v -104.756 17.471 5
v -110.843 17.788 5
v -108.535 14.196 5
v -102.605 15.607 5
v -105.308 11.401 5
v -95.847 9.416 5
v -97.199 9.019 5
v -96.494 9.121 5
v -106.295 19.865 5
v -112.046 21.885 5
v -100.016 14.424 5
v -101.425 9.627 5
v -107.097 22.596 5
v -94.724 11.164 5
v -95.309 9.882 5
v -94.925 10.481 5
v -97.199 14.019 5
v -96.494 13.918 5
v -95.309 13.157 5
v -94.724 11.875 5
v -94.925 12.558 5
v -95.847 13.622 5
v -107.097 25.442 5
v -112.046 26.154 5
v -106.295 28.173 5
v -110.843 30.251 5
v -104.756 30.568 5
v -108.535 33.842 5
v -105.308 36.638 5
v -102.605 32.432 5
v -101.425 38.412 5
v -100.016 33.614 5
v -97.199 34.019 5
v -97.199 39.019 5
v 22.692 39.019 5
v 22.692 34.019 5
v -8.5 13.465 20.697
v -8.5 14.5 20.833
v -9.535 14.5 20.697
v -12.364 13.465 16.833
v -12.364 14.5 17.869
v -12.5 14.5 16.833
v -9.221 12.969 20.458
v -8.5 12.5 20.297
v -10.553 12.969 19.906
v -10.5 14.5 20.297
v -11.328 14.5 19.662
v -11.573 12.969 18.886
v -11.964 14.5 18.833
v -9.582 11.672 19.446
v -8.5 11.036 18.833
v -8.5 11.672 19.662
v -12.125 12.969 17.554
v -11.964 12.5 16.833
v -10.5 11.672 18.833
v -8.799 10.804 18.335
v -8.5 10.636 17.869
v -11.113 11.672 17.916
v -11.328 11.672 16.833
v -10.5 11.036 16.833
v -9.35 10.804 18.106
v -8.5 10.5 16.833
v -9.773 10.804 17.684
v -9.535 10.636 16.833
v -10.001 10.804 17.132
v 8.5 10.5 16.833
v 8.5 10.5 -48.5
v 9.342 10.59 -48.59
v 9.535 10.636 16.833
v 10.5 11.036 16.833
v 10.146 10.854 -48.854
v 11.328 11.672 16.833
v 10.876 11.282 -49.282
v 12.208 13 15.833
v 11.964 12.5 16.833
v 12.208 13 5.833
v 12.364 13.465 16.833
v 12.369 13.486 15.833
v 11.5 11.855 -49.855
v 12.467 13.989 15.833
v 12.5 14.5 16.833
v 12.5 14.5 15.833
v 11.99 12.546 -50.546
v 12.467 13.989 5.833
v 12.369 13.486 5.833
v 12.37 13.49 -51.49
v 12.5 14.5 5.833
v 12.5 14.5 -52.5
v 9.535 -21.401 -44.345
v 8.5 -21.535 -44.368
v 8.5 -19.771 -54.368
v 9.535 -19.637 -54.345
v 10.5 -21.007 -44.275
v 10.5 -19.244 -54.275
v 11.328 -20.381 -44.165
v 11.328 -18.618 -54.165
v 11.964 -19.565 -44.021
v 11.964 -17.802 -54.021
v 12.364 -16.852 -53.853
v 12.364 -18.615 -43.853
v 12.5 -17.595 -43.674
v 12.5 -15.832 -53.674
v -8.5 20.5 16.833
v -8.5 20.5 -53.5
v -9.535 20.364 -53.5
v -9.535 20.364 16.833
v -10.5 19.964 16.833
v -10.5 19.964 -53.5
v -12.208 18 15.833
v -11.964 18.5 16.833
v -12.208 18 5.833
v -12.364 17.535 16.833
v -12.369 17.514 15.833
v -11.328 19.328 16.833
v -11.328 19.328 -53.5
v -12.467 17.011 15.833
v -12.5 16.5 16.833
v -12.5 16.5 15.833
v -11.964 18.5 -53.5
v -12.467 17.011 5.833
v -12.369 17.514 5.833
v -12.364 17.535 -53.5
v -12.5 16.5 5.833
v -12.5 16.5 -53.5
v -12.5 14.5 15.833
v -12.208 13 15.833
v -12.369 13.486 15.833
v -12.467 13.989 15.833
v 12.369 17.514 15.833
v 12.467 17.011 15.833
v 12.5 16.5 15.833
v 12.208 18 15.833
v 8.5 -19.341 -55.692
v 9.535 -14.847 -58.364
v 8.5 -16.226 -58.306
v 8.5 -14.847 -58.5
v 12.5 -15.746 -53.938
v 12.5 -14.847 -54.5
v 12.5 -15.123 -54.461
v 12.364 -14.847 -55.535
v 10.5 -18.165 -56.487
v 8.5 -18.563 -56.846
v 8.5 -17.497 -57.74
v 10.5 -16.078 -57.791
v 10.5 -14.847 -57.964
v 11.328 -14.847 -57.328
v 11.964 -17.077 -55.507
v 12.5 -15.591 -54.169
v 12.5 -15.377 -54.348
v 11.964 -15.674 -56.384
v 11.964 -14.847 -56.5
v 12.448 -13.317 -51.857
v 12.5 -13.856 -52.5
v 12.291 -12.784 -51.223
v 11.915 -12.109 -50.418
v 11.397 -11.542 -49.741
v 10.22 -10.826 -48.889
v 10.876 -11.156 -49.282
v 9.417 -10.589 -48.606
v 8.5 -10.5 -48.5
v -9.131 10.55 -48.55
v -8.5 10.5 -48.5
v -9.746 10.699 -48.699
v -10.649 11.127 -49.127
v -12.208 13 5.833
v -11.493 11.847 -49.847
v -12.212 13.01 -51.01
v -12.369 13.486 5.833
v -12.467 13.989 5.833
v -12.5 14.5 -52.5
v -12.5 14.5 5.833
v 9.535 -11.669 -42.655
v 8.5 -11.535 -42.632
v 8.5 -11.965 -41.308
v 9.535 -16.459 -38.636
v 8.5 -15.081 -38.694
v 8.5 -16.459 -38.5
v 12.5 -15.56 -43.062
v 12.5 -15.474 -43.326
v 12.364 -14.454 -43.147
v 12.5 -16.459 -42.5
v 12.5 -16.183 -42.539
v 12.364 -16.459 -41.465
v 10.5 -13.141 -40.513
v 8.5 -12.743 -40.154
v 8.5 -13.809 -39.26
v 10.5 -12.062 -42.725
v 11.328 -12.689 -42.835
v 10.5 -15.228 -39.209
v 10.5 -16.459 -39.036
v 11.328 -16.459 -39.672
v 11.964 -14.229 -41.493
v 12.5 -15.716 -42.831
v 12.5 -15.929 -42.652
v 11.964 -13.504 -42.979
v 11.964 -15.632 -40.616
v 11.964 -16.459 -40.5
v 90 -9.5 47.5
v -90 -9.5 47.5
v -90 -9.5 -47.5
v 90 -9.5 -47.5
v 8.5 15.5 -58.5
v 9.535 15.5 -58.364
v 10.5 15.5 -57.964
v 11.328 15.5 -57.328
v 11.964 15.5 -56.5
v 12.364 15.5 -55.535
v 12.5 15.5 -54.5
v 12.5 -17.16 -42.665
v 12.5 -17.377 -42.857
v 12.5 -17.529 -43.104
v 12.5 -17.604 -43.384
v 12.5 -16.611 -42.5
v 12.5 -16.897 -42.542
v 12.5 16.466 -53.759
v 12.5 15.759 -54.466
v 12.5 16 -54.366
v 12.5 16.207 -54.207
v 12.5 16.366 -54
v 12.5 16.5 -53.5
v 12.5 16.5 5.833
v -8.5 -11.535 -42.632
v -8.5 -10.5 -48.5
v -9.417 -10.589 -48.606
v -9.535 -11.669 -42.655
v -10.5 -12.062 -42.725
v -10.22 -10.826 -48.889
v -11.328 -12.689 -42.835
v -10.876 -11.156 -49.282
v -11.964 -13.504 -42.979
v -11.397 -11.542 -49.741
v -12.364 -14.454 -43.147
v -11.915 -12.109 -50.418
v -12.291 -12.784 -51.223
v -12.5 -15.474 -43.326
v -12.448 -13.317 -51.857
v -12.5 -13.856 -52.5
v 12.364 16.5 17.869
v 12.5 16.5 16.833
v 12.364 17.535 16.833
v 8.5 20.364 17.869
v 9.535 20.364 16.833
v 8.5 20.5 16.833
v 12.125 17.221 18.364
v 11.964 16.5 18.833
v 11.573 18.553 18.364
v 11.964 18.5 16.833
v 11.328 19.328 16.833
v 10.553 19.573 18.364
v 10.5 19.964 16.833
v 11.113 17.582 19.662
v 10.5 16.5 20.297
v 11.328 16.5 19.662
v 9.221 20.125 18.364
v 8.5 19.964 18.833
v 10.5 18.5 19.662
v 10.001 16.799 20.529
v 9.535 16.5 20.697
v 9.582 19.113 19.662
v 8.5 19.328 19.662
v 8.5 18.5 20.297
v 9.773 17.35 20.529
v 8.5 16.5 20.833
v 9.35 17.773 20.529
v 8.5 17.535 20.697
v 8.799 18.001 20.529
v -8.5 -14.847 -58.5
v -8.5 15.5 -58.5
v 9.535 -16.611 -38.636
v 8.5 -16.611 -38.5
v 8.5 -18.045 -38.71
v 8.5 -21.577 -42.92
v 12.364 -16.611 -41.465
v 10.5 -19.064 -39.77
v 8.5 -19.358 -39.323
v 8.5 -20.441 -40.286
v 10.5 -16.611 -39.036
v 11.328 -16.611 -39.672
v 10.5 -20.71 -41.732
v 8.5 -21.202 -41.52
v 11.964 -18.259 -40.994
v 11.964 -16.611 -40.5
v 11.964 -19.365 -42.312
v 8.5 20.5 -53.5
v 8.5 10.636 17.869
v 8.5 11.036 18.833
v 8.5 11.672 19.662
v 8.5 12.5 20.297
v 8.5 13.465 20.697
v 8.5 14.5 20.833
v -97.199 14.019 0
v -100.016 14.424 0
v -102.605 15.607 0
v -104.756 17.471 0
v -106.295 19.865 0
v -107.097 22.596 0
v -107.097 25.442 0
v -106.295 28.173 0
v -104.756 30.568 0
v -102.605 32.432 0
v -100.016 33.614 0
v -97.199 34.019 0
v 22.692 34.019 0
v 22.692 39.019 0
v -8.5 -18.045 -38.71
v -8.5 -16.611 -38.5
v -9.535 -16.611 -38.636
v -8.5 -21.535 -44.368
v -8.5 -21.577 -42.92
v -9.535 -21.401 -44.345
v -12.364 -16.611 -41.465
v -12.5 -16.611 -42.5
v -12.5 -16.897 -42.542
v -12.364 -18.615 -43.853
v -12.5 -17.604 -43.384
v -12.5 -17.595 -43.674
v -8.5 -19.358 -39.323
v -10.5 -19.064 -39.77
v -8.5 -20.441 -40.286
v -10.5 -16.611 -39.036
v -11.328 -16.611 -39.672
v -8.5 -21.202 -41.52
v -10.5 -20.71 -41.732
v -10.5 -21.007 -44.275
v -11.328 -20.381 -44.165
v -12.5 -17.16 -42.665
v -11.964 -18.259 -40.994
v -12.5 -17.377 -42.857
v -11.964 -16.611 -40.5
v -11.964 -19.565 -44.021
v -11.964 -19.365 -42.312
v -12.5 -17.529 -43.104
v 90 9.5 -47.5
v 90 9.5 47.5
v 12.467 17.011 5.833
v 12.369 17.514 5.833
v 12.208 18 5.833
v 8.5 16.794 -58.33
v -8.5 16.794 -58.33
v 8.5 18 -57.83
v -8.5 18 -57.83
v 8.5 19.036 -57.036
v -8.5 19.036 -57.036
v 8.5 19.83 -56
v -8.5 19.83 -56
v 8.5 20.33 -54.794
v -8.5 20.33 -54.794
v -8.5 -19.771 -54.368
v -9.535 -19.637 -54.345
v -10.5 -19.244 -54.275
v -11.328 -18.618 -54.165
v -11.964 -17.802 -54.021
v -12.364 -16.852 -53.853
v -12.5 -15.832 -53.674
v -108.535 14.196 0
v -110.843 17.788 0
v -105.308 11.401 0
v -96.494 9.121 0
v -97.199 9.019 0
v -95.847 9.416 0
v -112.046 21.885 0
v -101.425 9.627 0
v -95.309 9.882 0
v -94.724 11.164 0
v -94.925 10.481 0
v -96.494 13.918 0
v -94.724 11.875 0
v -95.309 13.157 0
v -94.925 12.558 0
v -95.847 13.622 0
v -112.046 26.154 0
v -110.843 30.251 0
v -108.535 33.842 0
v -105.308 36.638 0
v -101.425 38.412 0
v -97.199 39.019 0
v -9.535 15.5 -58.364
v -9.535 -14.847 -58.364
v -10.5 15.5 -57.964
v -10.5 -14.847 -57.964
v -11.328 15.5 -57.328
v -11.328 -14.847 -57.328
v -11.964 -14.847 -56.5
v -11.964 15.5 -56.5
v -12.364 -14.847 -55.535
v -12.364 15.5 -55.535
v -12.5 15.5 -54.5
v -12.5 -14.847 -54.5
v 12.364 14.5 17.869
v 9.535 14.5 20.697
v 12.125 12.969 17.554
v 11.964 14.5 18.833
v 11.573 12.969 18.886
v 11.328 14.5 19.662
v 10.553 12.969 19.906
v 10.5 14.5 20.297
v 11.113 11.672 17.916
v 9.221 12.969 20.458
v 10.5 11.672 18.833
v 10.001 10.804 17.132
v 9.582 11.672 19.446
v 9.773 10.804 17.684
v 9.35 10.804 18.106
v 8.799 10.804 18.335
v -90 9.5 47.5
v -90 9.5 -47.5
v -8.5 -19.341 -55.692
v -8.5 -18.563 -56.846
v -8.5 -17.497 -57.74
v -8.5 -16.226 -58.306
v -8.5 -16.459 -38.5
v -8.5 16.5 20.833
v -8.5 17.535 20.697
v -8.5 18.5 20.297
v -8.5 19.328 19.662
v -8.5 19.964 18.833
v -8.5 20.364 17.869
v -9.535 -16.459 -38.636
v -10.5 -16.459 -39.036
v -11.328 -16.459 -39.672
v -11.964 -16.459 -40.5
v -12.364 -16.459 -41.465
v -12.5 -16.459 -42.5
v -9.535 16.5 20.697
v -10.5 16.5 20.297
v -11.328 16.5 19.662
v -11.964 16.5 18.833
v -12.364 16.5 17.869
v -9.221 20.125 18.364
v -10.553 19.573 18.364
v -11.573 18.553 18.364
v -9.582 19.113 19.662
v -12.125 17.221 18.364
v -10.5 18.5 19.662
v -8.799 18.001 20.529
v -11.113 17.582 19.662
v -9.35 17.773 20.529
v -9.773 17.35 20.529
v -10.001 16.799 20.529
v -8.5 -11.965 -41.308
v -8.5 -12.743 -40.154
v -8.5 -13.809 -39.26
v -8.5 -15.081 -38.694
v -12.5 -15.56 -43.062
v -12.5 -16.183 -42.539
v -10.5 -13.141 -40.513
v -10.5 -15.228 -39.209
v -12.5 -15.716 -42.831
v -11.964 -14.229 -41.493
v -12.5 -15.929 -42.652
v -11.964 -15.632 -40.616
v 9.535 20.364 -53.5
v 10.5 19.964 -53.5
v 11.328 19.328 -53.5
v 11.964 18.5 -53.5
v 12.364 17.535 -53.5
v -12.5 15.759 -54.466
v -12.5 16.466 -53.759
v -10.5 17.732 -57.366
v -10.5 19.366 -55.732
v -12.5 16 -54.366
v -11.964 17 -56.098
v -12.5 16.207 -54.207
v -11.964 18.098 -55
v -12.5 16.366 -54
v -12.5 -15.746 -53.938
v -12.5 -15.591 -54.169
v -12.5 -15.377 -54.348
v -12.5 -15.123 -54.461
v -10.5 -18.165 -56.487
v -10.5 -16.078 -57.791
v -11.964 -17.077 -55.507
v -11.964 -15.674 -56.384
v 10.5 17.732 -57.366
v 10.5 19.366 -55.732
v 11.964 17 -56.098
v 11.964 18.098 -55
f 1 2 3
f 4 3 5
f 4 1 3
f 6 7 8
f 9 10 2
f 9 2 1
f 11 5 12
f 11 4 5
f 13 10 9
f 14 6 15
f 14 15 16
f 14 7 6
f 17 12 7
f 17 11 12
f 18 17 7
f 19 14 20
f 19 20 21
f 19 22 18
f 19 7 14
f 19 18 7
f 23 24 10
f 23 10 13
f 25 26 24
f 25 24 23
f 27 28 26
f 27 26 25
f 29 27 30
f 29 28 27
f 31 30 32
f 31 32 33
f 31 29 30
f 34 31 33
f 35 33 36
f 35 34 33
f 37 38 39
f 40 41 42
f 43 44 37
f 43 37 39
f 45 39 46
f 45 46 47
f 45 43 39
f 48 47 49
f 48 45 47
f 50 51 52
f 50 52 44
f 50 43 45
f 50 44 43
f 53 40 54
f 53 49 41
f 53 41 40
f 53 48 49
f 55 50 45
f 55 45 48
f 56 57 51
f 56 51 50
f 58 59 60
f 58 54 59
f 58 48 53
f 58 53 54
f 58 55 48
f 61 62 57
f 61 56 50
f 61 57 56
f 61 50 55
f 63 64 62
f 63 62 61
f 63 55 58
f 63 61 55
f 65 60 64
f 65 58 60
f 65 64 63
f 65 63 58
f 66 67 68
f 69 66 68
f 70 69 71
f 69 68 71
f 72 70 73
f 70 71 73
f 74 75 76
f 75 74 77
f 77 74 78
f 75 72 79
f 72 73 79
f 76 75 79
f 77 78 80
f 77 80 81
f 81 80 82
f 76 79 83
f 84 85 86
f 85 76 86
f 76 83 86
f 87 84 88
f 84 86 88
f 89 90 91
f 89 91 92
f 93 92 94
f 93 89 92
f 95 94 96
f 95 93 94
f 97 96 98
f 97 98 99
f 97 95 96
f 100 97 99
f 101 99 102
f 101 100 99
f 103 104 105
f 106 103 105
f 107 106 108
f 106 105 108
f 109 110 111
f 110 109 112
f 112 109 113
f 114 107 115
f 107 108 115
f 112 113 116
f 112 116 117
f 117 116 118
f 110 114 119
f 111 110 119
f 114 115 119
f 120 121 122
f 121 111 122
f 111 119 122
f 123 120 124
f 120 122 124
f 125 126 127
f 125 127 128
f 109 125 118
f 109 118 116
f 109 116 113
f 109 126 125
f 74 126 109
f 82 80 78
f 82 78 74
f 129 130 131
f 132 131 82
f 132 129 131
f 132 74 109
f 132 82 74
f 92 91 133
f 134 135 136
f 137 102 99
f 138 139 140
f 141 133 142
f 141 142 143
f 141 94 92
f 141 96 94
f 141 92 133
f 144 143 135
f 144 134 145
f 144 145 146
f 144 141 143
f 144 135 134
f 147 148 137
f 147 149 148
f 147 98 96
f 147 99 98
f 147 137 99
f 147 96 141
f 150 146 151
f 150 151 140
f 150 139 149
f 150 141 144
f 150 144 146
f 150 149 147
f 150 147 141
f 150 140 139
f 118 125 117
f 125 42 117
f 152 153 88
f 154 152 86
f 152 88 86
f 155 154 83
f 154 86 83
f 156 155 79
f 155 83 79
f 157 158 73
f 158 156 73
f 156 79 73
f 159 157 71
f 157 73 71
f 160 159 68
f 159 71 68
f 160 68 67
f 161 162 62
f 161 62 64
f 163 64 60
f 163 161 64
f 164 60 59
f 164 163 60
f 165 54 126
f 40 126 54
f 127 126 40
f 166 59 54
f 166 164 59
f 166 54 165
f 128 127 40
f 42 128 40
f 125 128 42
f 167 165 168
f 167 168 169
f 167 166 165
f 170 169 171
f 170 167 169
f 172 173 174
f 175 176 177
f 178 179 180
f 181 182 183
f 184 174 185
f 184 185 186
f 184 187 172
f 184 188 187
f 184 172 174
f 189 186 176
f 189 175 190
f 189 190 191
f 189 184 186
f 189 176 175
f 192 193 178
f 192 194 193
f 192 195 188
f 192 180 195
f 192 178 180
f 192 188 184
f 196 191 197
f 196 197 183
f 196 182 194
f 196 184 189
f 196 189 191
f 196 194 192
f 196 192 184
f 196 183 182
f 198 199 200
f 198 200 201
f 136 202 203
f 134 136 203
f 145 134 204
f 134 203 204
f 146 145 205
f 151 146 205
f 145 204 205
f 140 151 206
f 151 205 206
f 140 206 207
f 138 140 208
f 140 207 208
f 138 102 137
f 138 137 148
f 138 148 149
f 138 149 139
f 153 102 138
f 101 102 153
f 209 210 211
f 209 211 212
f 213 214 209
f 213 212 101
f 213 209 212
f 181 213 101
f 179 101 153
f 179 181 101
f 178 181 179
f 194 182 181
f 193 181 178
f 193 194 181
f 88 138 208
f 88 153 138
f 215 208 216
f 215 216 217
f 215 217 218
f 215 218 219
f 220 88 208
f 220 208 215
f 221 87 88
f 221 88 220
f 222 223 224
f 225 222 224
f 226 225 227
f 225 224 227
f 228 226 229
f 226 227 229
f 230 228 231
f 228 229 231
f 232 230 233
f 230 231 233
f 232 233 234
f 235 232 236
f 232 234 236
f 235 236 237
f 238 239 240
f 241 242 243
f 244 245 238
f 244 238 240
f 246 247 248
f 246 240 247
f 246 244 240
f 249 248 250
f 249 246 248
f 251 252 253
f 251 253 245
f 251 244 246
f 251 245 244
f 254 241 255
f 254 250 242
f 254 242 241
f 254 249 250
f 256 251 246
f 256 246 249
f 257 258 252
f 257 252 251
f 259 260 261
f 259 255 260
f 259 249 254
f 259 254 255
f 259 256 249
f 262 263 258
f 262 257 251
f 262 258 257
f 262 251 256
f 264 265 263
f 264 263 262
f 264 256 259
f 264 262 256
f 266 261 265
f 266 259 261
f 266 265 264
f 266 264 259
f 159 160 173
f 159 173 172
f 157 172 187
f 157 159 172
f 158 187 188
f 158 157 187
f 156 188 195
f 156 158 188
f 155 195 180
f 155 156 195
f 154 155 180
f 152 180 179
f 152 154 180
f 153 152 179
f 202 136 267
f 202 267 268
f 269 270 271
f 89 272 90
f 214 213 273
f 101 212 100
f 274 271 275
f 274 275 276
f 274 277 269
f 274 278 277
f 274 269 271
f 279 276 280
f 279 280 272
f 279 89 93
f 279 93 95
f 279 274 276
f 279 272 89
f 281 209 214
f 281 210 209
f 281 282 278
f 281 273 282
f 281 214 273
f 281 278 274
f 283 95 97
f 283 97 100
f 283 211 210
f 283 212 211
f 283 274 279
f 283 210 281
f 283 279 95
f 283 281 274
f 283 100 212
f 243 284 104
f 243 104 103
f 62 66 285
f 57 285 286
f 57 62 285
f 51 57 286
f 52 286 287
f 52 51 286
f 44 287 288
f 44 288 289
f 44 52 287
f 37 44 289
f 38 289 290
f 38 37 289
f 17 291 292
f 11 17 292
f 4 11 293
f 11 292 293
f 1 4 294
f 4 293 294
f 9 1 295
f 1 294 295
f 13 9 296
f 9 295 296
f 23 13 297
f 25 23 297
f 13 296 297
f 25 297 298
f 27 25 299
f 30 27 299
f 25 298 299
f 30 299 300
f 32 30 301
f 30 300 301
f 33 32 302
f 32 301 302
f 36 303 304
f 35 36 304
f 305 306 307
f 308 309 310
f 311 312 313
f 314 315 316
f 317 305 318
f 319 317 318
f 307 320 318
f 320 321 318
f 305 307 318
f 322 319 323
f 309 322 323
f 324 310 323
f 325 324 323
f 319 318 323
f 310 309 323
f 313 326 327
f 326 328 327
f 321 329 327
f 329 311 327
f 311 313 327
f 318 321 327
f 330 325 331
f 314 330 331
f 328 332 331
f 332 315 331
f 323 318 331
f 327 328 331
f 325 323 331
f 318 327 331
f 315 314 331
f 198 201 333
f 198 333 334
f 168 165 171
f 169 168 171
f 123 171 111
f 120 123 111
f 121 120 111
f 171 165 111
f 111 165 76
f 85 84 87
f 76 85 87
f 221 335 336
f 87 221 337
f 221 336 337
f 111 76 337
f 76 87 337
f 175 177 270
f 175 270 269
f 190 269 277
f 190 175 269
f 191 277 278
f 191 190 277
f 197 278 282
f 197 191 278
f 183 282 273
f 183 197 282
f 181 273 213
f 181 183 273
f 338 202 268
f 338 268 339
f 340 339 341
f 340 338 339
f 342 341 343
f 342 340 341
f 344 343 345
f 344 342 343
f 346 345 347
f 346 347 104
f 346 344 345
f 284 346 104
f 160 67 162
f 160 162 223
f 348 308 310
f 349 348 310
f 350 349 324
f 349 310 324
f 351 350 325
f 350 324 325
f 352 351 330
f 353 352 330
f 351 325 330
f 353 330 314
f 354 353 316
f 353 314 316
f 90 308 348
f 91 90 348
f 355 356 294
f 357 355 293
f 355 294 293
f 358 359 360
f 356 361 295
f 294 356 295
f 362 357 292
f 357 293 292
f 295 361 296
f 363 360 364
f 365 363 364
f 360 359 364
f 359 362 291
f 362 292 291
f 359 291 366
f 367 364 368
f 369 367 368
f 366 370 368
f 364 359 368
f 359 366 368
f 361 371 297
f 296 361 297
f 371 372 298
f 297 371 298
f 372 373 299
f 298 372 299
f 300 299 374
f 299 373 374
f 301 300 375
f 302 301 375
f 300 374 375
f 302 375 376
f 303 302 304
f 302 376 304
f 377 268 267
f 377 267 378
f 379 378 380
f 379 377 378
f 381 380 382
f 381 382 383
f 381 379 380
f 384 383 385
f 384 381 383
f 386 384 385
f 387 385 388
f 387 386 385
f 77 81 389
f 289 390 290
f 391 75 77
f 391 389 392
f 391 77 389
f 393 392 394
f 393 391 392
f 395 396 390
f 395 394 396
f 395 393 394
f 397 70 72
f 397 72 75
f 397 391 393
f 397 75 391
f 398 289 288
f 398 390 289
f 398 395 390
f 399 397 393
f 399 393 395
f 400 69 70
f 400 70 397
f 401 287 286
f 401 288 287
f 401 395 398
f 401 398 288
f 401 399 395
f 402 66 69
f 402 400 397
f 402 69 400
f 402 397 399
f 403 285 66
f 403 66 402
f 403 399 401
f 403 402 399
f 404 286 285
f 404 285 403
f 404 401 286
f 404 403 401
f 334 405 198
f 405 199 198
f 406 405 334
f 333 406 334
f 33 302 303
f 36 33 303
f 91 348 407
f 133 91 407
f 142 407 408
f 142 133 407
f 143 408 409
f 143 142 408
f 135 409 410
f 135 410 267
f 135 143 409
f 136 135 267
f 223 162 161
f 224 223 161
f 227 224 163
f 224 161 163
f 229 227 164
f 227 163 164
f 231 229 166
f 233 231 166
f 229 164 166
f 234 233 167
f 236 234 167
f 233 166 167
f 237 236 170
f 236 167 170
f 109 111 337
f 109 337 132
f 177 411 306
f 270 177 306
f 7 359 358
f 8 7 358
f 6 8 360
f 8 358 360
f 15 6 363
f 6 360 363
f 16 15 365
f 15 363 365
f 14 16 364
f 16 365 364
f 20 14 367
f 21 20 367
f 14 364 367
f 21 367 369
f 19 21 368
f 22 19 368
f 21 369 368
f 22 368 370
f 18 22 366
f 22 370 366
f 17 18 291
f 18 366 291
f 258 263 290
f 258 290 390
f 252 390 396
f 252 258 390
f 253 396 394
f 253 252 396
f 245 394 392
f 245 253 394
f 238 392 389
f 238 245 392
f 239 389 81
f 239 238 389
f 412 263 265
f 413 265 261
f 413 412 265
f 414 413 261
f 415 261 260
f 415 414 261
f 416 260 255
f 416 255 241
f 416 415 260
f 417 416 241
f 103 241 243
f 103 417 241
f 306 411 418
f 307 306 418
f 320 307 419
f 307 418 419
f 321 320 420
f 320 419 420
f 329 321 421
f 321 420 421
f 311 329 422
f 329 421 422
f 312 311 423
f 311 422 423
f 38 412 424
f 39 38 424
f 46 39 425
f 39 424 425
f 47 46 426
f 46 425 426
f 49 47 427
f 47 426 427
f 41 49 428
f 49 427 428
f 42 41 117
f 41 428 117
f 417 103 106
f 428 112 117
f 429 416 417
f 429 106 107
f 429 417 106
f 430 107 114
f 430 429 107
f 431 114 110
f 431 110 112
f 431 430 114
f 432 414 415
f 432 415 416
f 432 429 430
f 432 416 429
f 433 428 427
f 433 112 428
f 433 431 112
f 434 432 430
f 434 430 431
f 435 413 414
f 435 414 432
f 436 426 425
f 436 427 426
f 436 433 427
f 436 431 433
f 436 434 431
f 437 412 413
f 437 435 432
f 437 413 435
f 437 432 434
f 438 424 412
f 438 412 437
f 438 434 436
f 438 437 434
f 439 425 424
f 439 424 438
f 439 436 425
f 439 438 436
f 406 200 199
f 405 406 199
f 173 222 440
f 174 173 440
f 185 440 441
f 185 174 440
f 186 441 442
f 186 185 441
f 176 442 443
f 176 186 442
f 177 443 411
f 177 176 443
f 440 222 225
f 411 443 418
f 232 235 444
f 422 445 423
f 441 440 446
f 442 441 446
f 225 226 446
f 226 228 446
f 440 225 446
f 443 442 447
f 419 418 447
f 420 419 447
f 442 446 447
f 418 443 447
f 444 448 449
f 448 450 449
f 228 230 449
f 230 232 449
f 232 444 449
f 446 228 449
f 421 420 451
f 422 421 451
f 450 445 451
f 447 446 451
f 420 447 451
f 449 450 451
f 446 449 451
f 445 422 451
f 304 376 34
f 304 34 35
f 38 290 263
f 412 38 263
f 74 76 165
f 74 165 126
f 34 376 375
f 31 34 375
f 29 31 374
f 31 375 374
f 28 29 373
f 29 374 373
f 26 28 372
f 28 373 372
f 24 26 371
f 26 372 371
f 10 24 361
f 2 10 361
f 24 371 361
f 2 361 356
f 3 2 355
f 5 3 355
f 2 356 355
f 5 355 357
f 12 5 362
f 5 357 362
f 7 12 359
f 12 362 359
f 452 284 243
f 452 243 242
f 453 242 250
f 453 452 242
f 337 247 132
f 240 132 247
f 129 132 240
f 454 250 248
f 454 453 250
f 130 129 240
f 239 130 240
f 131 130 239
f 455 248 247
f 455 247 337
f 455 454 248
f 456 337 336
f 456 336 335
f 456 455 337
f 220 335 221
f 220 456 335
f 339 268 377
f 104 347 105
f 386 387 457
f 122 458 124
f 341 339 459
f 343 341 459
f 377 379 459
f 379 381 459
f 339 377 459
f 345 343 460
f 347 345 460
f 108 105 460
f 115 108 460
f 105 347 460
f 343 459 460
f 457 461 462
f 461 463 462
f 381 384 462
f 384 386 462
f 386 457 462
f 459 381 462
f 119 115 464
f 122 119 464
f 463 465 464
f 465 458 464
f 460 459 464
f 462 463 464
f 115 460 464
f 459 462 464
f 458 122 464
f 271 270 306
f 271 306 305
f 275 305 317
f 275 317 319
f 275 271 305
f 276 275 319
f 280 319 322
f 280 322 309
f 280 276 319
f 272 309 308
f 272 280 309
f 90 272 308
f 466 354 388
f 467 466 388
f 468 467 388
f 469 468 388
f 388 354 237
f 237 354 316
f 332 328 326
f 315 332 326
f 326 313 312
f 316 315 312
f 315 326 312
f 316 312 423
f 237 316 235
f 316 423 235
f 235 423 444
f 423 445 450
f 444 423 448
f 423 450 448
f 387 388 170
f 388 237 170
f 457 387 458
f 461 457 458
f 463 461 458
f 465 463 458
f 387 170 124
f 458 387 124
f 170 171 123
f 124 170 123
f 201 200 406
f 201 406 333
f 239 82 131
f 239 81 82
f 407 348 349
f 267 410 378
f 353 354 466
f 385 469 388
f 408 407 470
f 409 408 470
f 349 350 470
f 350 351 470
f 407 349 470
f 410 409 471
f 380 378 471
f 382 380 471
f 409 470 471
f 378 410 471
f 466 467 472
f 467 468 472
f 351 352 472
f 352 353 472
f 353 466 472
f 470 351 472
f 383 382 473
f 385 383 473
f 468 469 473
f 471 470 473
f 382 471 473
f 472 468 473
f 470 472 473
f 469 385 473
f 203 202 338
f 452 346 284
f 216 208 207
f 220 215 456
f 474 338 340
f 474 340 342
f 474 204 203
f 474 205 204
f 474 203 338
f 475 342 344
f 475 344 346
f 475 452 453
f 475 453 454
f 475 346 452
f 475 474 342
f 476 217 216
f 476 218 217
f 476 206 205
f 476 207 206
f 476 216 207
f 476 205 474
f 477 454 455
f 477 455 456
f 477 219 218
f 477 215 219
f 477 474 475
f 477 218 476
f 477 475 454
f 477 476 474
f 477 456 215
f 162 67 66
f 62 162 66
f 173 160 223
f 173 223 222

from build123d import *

# Parameters (mm, degrees)
F0_W          = 180
F0_H          = 95
F1_DEPTH      = 9.5
F3_W          = 10
F3_H          = 69.3333333333
F3_W_2        = 5
F3_H_2        = 10
F4_DEPTH      = 12.5
F5_T1_DEPTH   = 10.1542661189
F5_T3_DEPTH   = 65.3333333333
F5_T5_DEPTH   = 2
F5_T7_DEPTH   = 17
F5_T9_DEPTH   = 30.3474206258
F5_T11_DEPTH  = 70.3333333333
F5_T13_DEPTH  = 0.1519224699
F5_S17_W      = 4
F5_S17_H      = 4
F5_T18_DEPTH  = 4
F5_S23_W      = 4
F5_S23_H      = 4
F5_T24_DEPTH  = 4
F5_S29_W      = 4
F5_S29_H      = 4
F5_T30_DEPTH  = 4
F5_S35_W      = 4
F5_S35_H      = 4
F5_T36_DEPTH  = 4
F5_T42_DEPTH  = 31
F5_T47_DEPTH  = 31
F5_T50_ANGLE  = 100
F5_T52_ANGLE  = 80
F5_T54_ANGLE  = 90
F5_T56_ANGLE  = 80
F5_T60_DEPTH  = 15.958767963
F5_T63_ANGLE  = 100
F5_T65_ANGLE  = 80
F5_T67_ANGLE  = 90
F5_T69_ANGLE  = 80
F5_T73_DEPTH  = 15.958767963
F5_T79_DEPTH  = 75.3333333333
F5_T83_DEPTH  = 41
F5_T90_DEPTH  = 15.958767963
F5_T94_DEPTH  = 31
F5_T101_DEPTH = 75.3333333333
F5_T105_DEPTH = 41
F5_T112_DEPTH = 15.958767963
F5_T116_DEPTH = 31
F6_W          = 119.8909639199
F6_H          = 5
F7_DEPTH      = 5


# Not quite as in the source:
# - a fillet or chamfer that OpenCascade refuses, or shapes differently, is made with other operations: its cross-section is extruded or revolved along the edge and cut away or added


with BuildPart() as f1:
    # F0 (on Front) → F1 (new body, symmetric)
    with BuildSketch(Plane.XZ):
        Rectangle(F0_W, F0_H)
    extrude(amount=F1_DEPTH, both=True)


with BuildPart() as f4:
    # F3 (on Right) → F4 (new body, symmetric)
    with BuildSketch(Plane.YZ):
        with Locations((15.5, -13.8333333333)):
            Rectangle(F3_W, F3_H)
        with Locations((15.5, 10.8333333333)):
            Rectangle(F3_W_2, F3_H_2, mode=Mode.SUBTRACT)
        with BuildLine():
            Line((20.5, -53.5), (20.5, -48.5))
            Line((20.5, -48.5), (10.5, -48.5))
            Line((10.5, -48.5), (-10.5, -48.5))
            Line((-10.5, -48.5), (-8.7367301929, -58.5))
            Line((-8.7367301929, -58.5), (15.5, -58.5))
            ThreePointArc((15.5, -58.5), (19.0355339059, -57.0355339059), (20.5, -53.5))
        make_face()
        Polygon((-8.7367301929, -58.5), (-10.5, -48.5), (-10.5, -58.5), align=None)
        with BuildLine():
            Line((-10.5, -58.5), (-10.5, -48.5))
            Line((-10.5, -48.5), (-11.5347291979, -42.6317591117))
            ThreePointArc((-11.5347291979, -42.6317591117), (-13.2448299145, -39.6697777844), (-16.458767963, -38.5))
            Line((-16.458767963, -38.5), (-16.6106904328, -38.5))
            ThreePointArc((-16.6106904328, -38.5), (-20.4409126484, -40.2860619516), (-21.5347291979, -44.3682408883))
            Line((-21.5347291979, -44.3682408883), (-19.7714593908, -54.3682408883))
            ThreePointArc((-19.7714593908, -54.3682408883), (-18.0613586742, -57.3302222156), (-14.8474206258, -58.5))
            Line((-14.8474206258, -58.5), (-10.5, -58.5))
        make_face()
    extrude(amount=F4_DEPTH, both=True)

    # F5: fillet of radius 4 on 10 edges, made by hand

    # F5_s2 → F5_t1 (cut)
    with BuildSketch(Plane(origin=(0, 6.9380645139, -39.3477191408), x_dir=(1, 0, 0), z_dir=(0, 0.1736481777, -0.984807753))):
        with BuildLine():
            ThreePointArc((-8.5, 28.9120324497), (-11.3284271247, 27.7404595744), (-12.5, 24.9120324497))
            Line((-12.5, 24.9120324497), (-12.5, 28.9120324497))
            Line((-12.5, 28.9120324497), (-8.5, 28.9120324497))
        make_face()
        with BuildLine():
            ThreePointArc((8.5, 28.9120324497), (11.3284271247, 27.7404595744), (12.5, 24.9120324497))
            Line((12.5, 24.9120324497), (12.5, 28.9120324497))
            Line((12.5, 28.9120324497), (8.5, 28.9120324497))
        make_face()
    extrude(amount=F5_T1_DEPTH, mode=Mode.SUBTRACT)

    # F5_s4 → F5_t3 (cut)
    with BuildSketch(Plane.XY.offset(-48.5)):
        with BuildLine():
            ThreePointArc((8.5, 10.5), (11.3284271247, 11.6715728753), (12.5, 14.5))
            Line((12.5, 14.5), (12.5, 10.5))
            Line((12.5, 10.5), (8.5, 10.5))
        make_face()
        with BuildLine():
            ThreePointArc((-8.5, 10.5), (-11.3284271247, 11.6715728753), (-12.5, 14.5))
            Line((-12.5, 14.5), (-12.5, 10.5))
            Line((-12.5, 10.5), (-8.5, 10.5))
        make_face()
    extrude(amount=F5_T3_DEPTH, mode=Mode.SUBTRACT)

    # F5_s6 → F5_t5 (cut)
    with BuildSketch(Plane.XZ.offset(-16.5)):
        with BuildLine():
            ThreePointArc((-8.5, 20.8333333333), (-11.3284271247, 19.6617604581), (-12.5, 16.8333333333))
            Line((-12.5, 16.8333333333), (-12.5, 20.8333333333))
            Line((-12.5, 20.8333333333), (-8.5, 20.8333333333))
        make_face()
        with BuildLine():
            ThreePointArc((8.5, 20.8333333333), (11.3284271247, 19.6617604581), (12.5, 16.8333333333))
            Line((12.5, 16.8333333333), (12.5, 20.8333333333))
            Line((12.5, 20.8333333333), (8.5, 20.8333333333))
        make_face()
    extrude(amount=F5_T5_DEPTH, mode=Mode.SUBTRACT)

    # F5_s8 → F5_t7 (cut)
    with BuildSketch(Plane.YZ.offset(-8.5)):
        with BuildLine():
            ThreePointArc((10.5, 16.8333333333), (11.6715728753, 19.6617604581), (14.5, 20.8333333333))
            Line((14.5, 20.8333333333), (10.5, 20.8333333333))
            Line((10.5, 20.8333333333), (10.5, 16.8333333333))
        make_face()
        with BuildLine():
            ThreePointArc((16.5, 20.8333333333), (19.3284271247, 19.6617604581), (20.5, 16.8333333333))
            Line((20.5, 16.8333333333), (20.5, 20.8333333333))
            Line((20.5, 20.8333333333), (16.5, 20.8333333333))
        make_face()
    extrude(amount=F5_T7_DEPTH, mode=Mode.SUBTRACT)

    # F5_s10 → F5_t9 (cut)
    with BuildSketch(Plane.XZ.offset(-15.5)):
        with BuildLine():
            ThreePointArc((8.5, -58.5), (11.3284271247, -57.3284271247), (12.5, -54.5))
            Line((12.5, -54.5), (12.5, -58.5))
            Line((12.5, -58.5), (8.5, -58.5))
        make_face()
        with BuildLine():
            ThreePointArc((-8.5, -58.5), (-11.3284271247, -57.3284271247), (-12.5, -54.5))
            Line((-12.5, -54.5), (-12.5, -58.5))
            Line((-12.5, -58.5), (-8.5, -58.5))
        make_face()
    extrude(amount=F5_T9_DEPTH, mode=Mode.SUBTRACT)

    # F5_s12 → F5_t11 (cut)
    with BuildSketch(Plane.XY.offset(-53.5)):
        with BuildLine():
            ThreePointArc((8.5, 20.5), (11.3284271247, 19.3284271247), (12.5, 16.5))
            Line((12.5, 16.5), (12.5, 20.5))
            Line((12.5, 20.5), (8.5, 20.5))
        make_face()
        with BuildLine():
            ThreePointArc((-8.5, 20.5), (-11.3284271247, 19.3284271247), (-12.5, 16.5))
            Line((-12.5, 16.5), (-12.5, 20.5))
            Line((-12.5, 20.5), (-8.5, 20.5))
        make_face()
    extrude(amount=F5_T11_DEPTH, mode=Mode.SUBTRACT)

    # F5_s14 → F5_t13 (cut)
    with BuildSketch(Plane.XZ.offset(16.458767963)):
        with BuildLine():
            ThreePointArc((8.5, -38.5), (11.3284271247, -39.6715728753), (12.5, -42.5))
            Line((12.5, -42.5), (12.5, -38.5))
            Line((12.5, -38.5), (8.5, -38.5))
        make_face()
        with BuildLine():
            ThreePointArc((-8.5, -38.5), (-11.3284271247, -39.6715728753), (-12.5, -42.5))
            Line((-12.5, -42.5), (-12.5, -38.5))
            Line((-12.5, -38.5), (-8.5, -38.5))
        make_face()
    extrude(amount=F5_T13_DEPTH, mode=Mode.SUBTRACT)


with BuildPart() as f5_tool16:
    # F5_s17 → F5_t18 (new body)
    with BuildSketch(Plane.XZ.offset(-14.5)):
        with Locations((10.5, 18.8333333333)):
            Rectangle(F5_S17_W, F5_S17_H)
    extrude(amount=F5_T18_DEPTH)

    # F5_s19 → F5_t20 (revolve, cut)
    with BuildSketch(Plane(origin=(8.5, 14.5, 16.8333333333), x_dir=(-0.7071067812, 0, -0.7071067812), z_dir=(-0.7071067812, 0, 0.7071067812))):
        with BuildLine():
            ThreePointArc((0, -4), (4, 0), (0, 4))
            Line((0, 4), (0, -4))
        make_face()
    revolve(axis=Axis((8.5, 14.5, 16.8333333333), (0, -1, 0)), mode=Mode.SUBTRACT)


with BuildPart() as f4_1:
    add(f4.part)

    # F5_t15: cut F5_tool16
    add(f5_tool16.part, mode=Mode.SUBTRACT)


with BuildPart() as f5_tool22:
    # F5_s23 → F5_t24 (new body)
    with BuildSketch(Plane.XZ.offset(-14.5)):
        with Locations((-10.5, 18.8333333333)):
            Rectangle(F5_S23_W, F5_S23_H)
    extrude(amount=F5_T24_DEPTH)

    # F5_s25 → F5_t26 (revolve, cut)
    with BuildSketch(Plane(origin=(-8.5, 14.5, 16.8333333333), x_dir=(0.7071067812, 0, -0.7071067812), z_dir=(-0.7071067812, 0, -0.7071067812))):
        with BuildLine():
            ThreePointArc((0, -4), (4, 0), (0, 4))
            Line((0, 4), (0, -4))
        make_face()
    revolve(axis=Axis((-8.5, 14.5, 16.8333333333), (0, -1, 0)), mode=Mode.SUBTRACT)


with BuildPart() as f4_2:
    add(f4_1.part)

    # F5_t21: cut F5_tool22
    add(f5_tool22.part, mode=Mode.SUBTRACT)


with BuildPart() as f5_tool28:
    # F5_s29 → F5_t30 (new body)
    with BuildSketch(Plane.XY.offset(16.8333333333)):
        with Locations((-10.5, 18.5)):
            Rectangle(F5_S29_W, F5_S29_H)
    extrude(amount=F5_T30_DEPTH)

    # F5_s31 → F5_t32 (revolve, cut)
    with BuildSketch(Plane(origin=(-8.5, 16.5, 16.8333333333), x_dir=(0.7071067812, -0.7071067812, 0), z_dir=(-0.7071067812, -0.7071067812, 0))):
        with BuildLine():
            ThreePointArc((0, -4), (4, 0), (0, 4))
            Line((0, 4), (0, -4))
        make_face()
    revolve(axis=Axis((-8.5, 16.5, 16.8333333333), (0, 0, 1)), mode=Mode.SUBTRACT)


with BuildPart() as f4_3:
    add(f4_2.part)

    # F5_t27: cut F5_tool28
    add(f5_tool28.part, mode=Mode.SUBTRACT)


with BuildPart() as f5_tool34:
    # F5_s35 → F5_t36 (new body)
    with BuildSketch(Plane.XY.offset(16.8333333333)):
        with Locations((10.5, 18.5)):
            Rectangle(F5_S35_W, F5_S35_H)
    extrude(amount=F5_T36_DEPTH)

    # F5_s37 → F5_t38 (revolve, cut)
    with BuildSketch(Plane(origin=(8.5, 16.5, 16.8333333333), x_dir=(-0.7071067812, -0.7071067812, 0), z_dir=(-0.7071067812, 0.7071067812, 0))):
        with BuildLine():
            ThreePointArc((0, -4), (4, 0), (0, 4))
            Line((0, 4), (0, -4))
        make_face()
    revolve(axis=Axis((8.5, 16.5, 16.8333333333), (0, 0, 1)), mode=Mode.SUBTRACT)


with BuildPart() as f4_4:
    add(f4_3.part)

    # F5_t33: cut F5_tool34
    add(f5_tool34.part, mode=Mode.SUBTRACT)


with BuildPart() as f5_tool40:
    # F5_s41 → F5_t42 (new body)
    with BuildSketch(Plane.XZ.offset(-10.5)):
        with BuildLine():
            ThreePointArc((12.5, -52.5), (11.3284271247, -49.6715728753), (8.5, -48.5))
            Line((8.5, -48.5), (12.5, -48.5))
            Line((12.5, -48.5), (12.5, -52.5))
        make_face()
    extrude(amount=F5_T42_DEPTH)

    split(bisect_by=Plane(origin=(0, -18.4773747348, -3.2580596984), x_dir=(1, 0, 0), z_dir=(0, 0.984807753, 0.1736481777)), keep=Keep.TOP)


with BuildPart() as f4_5:
    add(f4_4.part)

    # F5_t39: cut F5_tool40
    add(f5_tool40.part, mode=Mode.SUBTRACT)


with BuildPart() as f5_tool45:
    # F5_s46 → F5_t47 (new body)
    with BuildSketch(Plane.XZ.offset(-10.5)):
        with BuildLine():
            ThreePointArc((-8.5, -48.5), (-11.3284271247, -49.6715728753), (-12.5, -52.5))
            Line((-12.5, -52.5), (-12.5, -48.5))
            Line((-12.5, -48.5), (-8.5, -48.5))
        make_face()
    extrude(amount=F5_T47_DEPTH)

    split(bisect_by=Plane(origin=(0, -18.4773747348, -3.2580596984), x_dir=(1, 0, 0), z_dir=(0, 0.984807753, 0.1736481777)), keep=Keep.TOP)


with BuildPart() as f4_6:
    add(f4_5.part)

    # F5_t44: cut F5_tool45
    add(f5_tool45.part, mode=Mode.SUBTRACT)

    # F5_s49 → F5_t50 (revolve, cut)
    with BuildSketch(Plane.XZ.offset(16.6106904328)):
        with BuildLine():
            ThreePointArc((8.5, -38.5), (11.3284271247, -39.6715728753), (12.5, -42.5))
            Line((12.5, -42.5), (12.5, -38.5))
            Line((12.5, -38.5), (8.5, -38.5))
        make_face()
    revolve(axis=Axis((12.5, -16.6106904328, -43.5), (1, 0, 0)), revolution_arc=F5_T50_ANGLE, mode=Mode.SUBTRACT)

    # F5_s51 → F5_t52 (revolve, cut)
    with BuildSketch(Plane(origin=(0, 8.7013343209, -49.3477191408), x_dir=(1, 0, 0), z_dir=(0, -0.1736481777, 0.984807753))):
        with BuildLine():
            ThreePointArc((8.5, -28.9120324497), (11.3284271247, -27.7404595744), (12.5, -24.9120324497))
            Line((12.5, -24.9120324497), (12.5, -28.9120324497))
            Line((12.5, -28.9120324497), (8.5, -28.9120324497))
        make_face()
    revolve(axis=Axis((12.5, -14.8474206258, -53.5), (1, 0, 0)), revolution_arc=F5_T52_ANGLE, mode=Mode.SUBTRACT)

    # F5_s53 → F5_t54 (revolve, cut)
    with BuildSketch(Plane.XZ.offset(-15.5)):
        with BuildLine():
            ThreePointArc((8.5, -58.5), (11.3284271247, -57.3284271247), (12.5, -54.5))
            Line((12.5, -54.5), (12.5, -58.5))
            Line((12.5, -58.5), (8.5, -58.5))
        make_face()
    revolve(axis=Axis((12.5, 15.5, -53.5), (1, 0, 0)), revolution_arc=F5_T54_ANGLE, mode=Mode.SUBTRACT)

    # F5_s55 → F5_t56 (revolve, cut)
    with BuildSketch(Plane(origin=(0, 6.9426455369, -39.3736994133), x_dir=(1, 0, 0), z_dir=(0, 0.1736481777, -0.984807753))):
        with BuildLine():
            ThreePointArc((8.5, 18.7624180235), (11.3284271247, 19.9339908987), (12.5, 22.7624180235))
            Line((12.5, 22.7624180235), (12.5, 18.7624180235))
            Line((12.5, 18.7624180235), (8.5, 18.7624180235))
        make_face()
    revolve(axis=Axis((12.5, -16.458767963, -43.5), (1, 0, 0)), revolution_arc=F5_T56_ANGLE, mode=Mode.SUBTRACT)


with BuildPart() as f5_tool58:
    # F5_s59 → F5_t60 (new body)
    with BuildSketch(Plane(origin=(0, 9.7138565114, -55.0900178317), x_dir=(1, 0, 0), z_dir=(0, -0.1736481777, 0.984807753))):
        with BuildLine():
            ThreePointArc((8.5, -18.7624180235), (11.3284271247, -19.9339908987), (12.5, -22.7624180235))
            Line((12.5, -22.7624180235), (12.5, -18.7624180235))
            Line((12.5, -18.7624180235), (8.5, -18.7624180235))
        make_face()
    extrude(amount=F5_T60_DEPTH)

    split(bisect_by=Plane.XY.offset(-48.5), keep=Keep.TOP)


with BuildPart() as f4_7:
    add(f4_6.part)

    # F5_t57: cut F5_tool58
    add(f5_tool58.part, mode=Mode.SUBTRACT)

    # F5_s62 → F5_t63 (revolve, cut)
    with BuildSketch(Plane.XZ.offset(16.6106904328)):
        with BuildLine():
            ThreePointArc((-8.5, -38.5), (-11.3284271247, -39.6715728753), (-12.5, -42.5))
            Line((-12.5, -42.5), (-12.5, -38.5))
            Line((-12.5, -38.5), (-8.5, -38.5))
        make_face()
    revolve(axis=Axis((-12.5, -16.6106904328, -43.5), (1, 0, 0)), revolution_arc=F5_T63_ANGLE, mode=Mode.SUBTRACT)

    # F5_s64 → F5_t65 (revolve, cut)
    with BuildSketch(Plane(origin=(0, 8.7013343209, -49.3477191408), x_dir=(1, 0, 0), z_dir=(0, -0.1736481777, 0.984807753))):
        with BuildLine():
            ThreePointArc((-8.5, -28.9120324497), (-11.3284271247, -27.7404595744), (-12.5, -24.9120324497))
            Line((-12.5, -24.9120324497), (-12.5, -28.9120324497))
            Line((-12.5, -28.9120324497), (-8.5, -28.9120324497))
        make_face()
    revolve(axis=Axis((-12.5, -14.8474206258, -53.5), (1, 0, 0)), revolution_arc=F5_T65_ANGLE, mode=Mode.SUBTRACT)

    # F5_s66 → F5_t67 (revolve, cut)
    with BuildSketch(Plane.XZ.offset(-15.5)):
        with BuildLine():
            ThreePointArc((-8.5, -58.5), (-11.3284271247, -57.3284271247), (-12.5, -54.5))
            Line((-12.5, -54.5), (-12.5, -58.5))
            Line((-12.5, -58.5), (-8.5, -58.5))
        make_face()
    revolve(axis=Axis((-12.5, 15.5, -53.5), (1, 0, 0)), revolution_arc=F5_T67_ANGLE, mode=Mode.SUBTRACT)

    # F5_s68 → F5_t69 (revolve, cut)
    with BuildSketch(Plane(origin=(0, 6.9426455369, -39.3736994133), x_dir=(1, 0, 0), z_dir=(0, 0.1736481777, -0.984807753))):
        with BuildLine():
            ThreePointArc((-8.5, 18.7624180235), (-11.3284271247, 19.9339908987), (-12.5, 22.7624180235))
            Line((-12.5, 22.7624180235), (-12.5, 18.7624180235))
            Line((-12.5, 18.7624180235), (-8.5, 18.7624180235))
        make_face()
    revolve(axis=Axis((-12.5, -16.458767963, -43.5), (1, 0, 0)), revolution_arc=F5_T69_ANGLE, mode=Mode.SUBTRACT)


with BuildPart() as f5_tool71:
    # F5_s72 → F5_t73 (new body)
    with BuildSketch(Plane(origin=(0, 9.7138565114, -55.0900178317), x_dir=(1, 0, 0), z_dir=(0, -0.1736481777, 0.984807753))):
        with BuildLine():
            ThreePointArc((-8.5, -18.7624180235), (-11.3284271247, -19.9339908987), (-12.5, -22.7624180235))
            Line((-12.5, -22.7624180235), (-12.5, -18.7624180235))
            Line((-12.5, -18.7624180235), (-8.5, -18.7624180235))
        make_face()
    extrude(amount=F5_T73_DEPTH)

    split(bisect_by=Plane.XY.offset(-48.5), keep=Keep.TOP)


with BuildPart() as f4_8:
    add(f4_7.part)

    # F5_t70: cut F5_tool71
    add(f5_tool71.part, mode=Mode.SUBTRACT)


with BuildPart() as f5_tool77:
    # F5_s78 → F5_t79 (new body)
    with BuildSketch(Plane.XY.offset(16.8333333333)):
        with BuildLine():
            ThreePointArc((8.5, 10.5), (11.3284271247, 11.6715728753), (12.5, 14.5))
            Line((12.5, 14.5), (12.5, 10.5))
            Line((12.5, 10.5), (8.5, 10.5))
        make_face()
    extrude(amount=-F5_T79_DEPTH)

    split(bisect_by=Plane.XY.offset(-48.5), keep=Keep.BOTTOM)


with BuildPart() as f5_tool81:
    # F5_s82 → F5_t83 (new body)
    with BuildSketch(Plane.XZ.offset(-20.5)):
        with BuildLine():
            ThreePointArc((12.5, -52.5), (11.3284271247, -49.6715728753), (8.5, -48.5))
            Line((8.5, -48.5), (12.5, -48.5))
            Line((12.5, -48.5), (12.5, -52.5))
        make_face()
    extrude(amount=F5_T83_DEPTH)

    split(bisect_by=Plane.XZ.offset(-10.5), keep=Keep.BOTTOM)


with BuildPart() as f5_tool77_1:
    add(f5_tool77.part)

    # F5_t85: intersect F5_tool81
    add(f5_tool81.part, mode=Mode.INTERSECT)


with BuildPart() as f4_9:
    add(f4_8.part)

    # F5_t75: cut F5_tool77
    add(f5_tool77_1.part, mode=Mode.SUBTRACT)


with BuildPart() as f5_tool88:
    # F5_s89 → F5_t90 (new body)
    with BuildSketch(Plane(origin=(0, 9.7138565114, -55.0900178317), x_dir=(1, 0, 0), z_dir=(0, -0.1736481777, 0.984807753))):
        with BuildLine():
            ThreePointArc((8.5, -18.7624180235), (11.3284271247, -19.9339908987), (12.5, -22.7624180235))
            Line((12.5, -22.7624180235), (12.5, -18.7624180235))
            Line((12.5, -18.7624180235), (8.5, -18.7624180235))
        make_face()
    extrude(amount=F5_T90_DEPTH)

    split(bisect_by=Plane.XY.offset(-48.5), keep=Keep.BOTTOM)


with BuildPart() as f5_tool92:
    # F5_s93 → F5_t94 (new body)
    with BuildSketch(Plane.XZ.offset(-10.5)):
        with BuildLine():
            ThreePointArc((12.5, -52.5), (11.3284271247, -49.6715728753), (8.5, -48.5))
            Line((8.5, -48.5), (12.5, -48.5))
            Line((12.5, -48.5), (12.5, -52.5))
        make_face()
    extrude(amount=F5_T94_DEPTH)

    split(bisect_by=Plane(origin=(0, -18.4773747348, -3.2580596984), x_dir=(1, 0, 0), z_dir=(0, -0.984807753, -0.1736481777)), keep=Keep.TOP)


with BuildPart() as f5_tool88_1:
    add(f5_tool88.part)

    # F5_t96: intersect F5_tool92
    add(f5_tool92.part, mode=Mode.INTERSECT)


with BuildPart() as f4_10:
    add(f4_9.part)

    # F5_t86: cut F5_tool88
    add(f5_tool88_1.part, mode=Mode.SUBTRACT)


with BuildPart() as f5_tool99:
    # F5_s100 → F5_t101 (new body)
    with BuildSketch(Plane.XY.offset(16.8333333333)):
        with BuildLine():
            ThreePointArc((-8.5, 10.5), (-11.3284271247, 11.6715728753), (-12.5, 14.5))
            Line((-12.5, 14.5), (-12.5, 10.5))
            Line((-12.5, 10.5), (-8.5, 10.5))
        make_face()
    extrude(amount=-F5_T101_DEPTH)

    split(bisect_by=Plane.XY.offset(-48.5), keep=Keep.BOTTOM)


with BuildPart() as f5_tool103:
    # F5_s104 → F5_t105 (new body)
    with BuildSketch(Plane.XZ.offset(-20.5)):
        with BuildLine():
            ThreePointArc((-8.5, -48.5), (-11.3284271247, -49.6715728753), (-12.5, -52.5))
            Line((-12.5, -52.5), (-12.5, -48.5))
            Line((-12.5, -48.5), (-8.5, -48.5))
        make_face()
    extrude(amount=F5_T105_DEPTH)

    split(bisect_by=Plane.XZ.offset(-10.5), keep=Keep.BOTTOM)


with BuildPart() as f5_tool99_1:
    add(f5_tool99.part)

    # F5_t107: intersect F5_tool103
    add(f5_tool103.part, mode=Mode.INTERSECT)


with BuildPart() as f4_11:
    add(f4_10.part)

    # F5_t97: cut F5_tool99
    add(f5_tool99_1.part, mode=Mode.SUBTRACT)


with BuildPart() as f5_tool110:
    # F5_s111 → F5_t112 (new body)
    with BuildSketch(Plane(origin=(0, 9.7138565114, -55.0900178317), x_dir=(1, 0, 0), z_dir=(0, -0.1736481777, 0.984807753))):
        with BuildLine():
            ThreePointArc((-8.5, -18.7624180235), (-11.3284271247, -19.9339908987), (-12.5, -22.7624180235))
            Line((-12.5, -22.7624180235), (-12.5, -18.7624180235))
            Line((-12.5, -18.7624180235), (-8.5, -18.7624180235))
        make_face()
    extrude(amount=F5_T112_DEPTH)

    split(bisect_by=Plane.XY.offset(-48.5), keep=Keep.BOTTOM)


with BuildPart() as f5_tool114:
    # F5_s115 → F5_t116 (new body)
    with BuildSketch(Plane.XZ.offset(-10.5)):
        with BuildLine():
            ThreePointArc((-8.5, -48.5), (-11.3284271247, -49.6715728753), (-12.5, -52.5))
            Line((-12.5, -52.5), (-12.5, -48.5))
            Line((-12.5, -48.5), (-8.5, -48.5))
        make_face()
    extrude(amount=F5_T116_DEPTH)

    split(bisect_by=Plane(origin=(0, -18.4773747348, -3.2580596984), x_dir=(1, 0, 0), z_dir=(0, -0.984807753, -0.1736481777)), keep=Keep.TOP)


with BuildPart() as f5_tool110_1:
    add(f5_tool110.part)

    # F5_t118: intersect F5_tool114
    add(f5_tool114.part, mode=Mode.INTERSECT)


with BuildPart() as f4_12:
    add(f4_11.part)

    # F5_t108: cut F5_tool110
    add(f5_tool110_1.part, mode=Mode.SUBTRACT)


with BuildPart() as f7:
    # F6 (on Top) → F7 (new body)
    with BuildSketch(Plane.XY):
        with Locations((-37.2533172926, 36.5193495899)):
            Rectangle(F6_W, F6_H)
        with BuildLine():
            Line((-97.1987992525, 34.0193495899), (-97.1987992525, 39.0193495899))
            ThreePointArc((-97.1987992525, 39.0193495899), (-112.1987992525, 24.0193495899), (-97.1987992525, 9.0193495899))
            ThreePointArc((-97.1987992525, 9.0193495899), (-94.6987992525, 11.5193495899), (-97.1987992525, 14.0193495899))
            ThreePointArc((-97.1987992525, 14.0193495899), (-107.1987992525, 24.0193495899), (-97.1987992525, 34.0193495899))
        make_face()
    extrude(amount=F7_DEPTH)


solid = Compound([f1.part, f4_12.part, f7.part])
